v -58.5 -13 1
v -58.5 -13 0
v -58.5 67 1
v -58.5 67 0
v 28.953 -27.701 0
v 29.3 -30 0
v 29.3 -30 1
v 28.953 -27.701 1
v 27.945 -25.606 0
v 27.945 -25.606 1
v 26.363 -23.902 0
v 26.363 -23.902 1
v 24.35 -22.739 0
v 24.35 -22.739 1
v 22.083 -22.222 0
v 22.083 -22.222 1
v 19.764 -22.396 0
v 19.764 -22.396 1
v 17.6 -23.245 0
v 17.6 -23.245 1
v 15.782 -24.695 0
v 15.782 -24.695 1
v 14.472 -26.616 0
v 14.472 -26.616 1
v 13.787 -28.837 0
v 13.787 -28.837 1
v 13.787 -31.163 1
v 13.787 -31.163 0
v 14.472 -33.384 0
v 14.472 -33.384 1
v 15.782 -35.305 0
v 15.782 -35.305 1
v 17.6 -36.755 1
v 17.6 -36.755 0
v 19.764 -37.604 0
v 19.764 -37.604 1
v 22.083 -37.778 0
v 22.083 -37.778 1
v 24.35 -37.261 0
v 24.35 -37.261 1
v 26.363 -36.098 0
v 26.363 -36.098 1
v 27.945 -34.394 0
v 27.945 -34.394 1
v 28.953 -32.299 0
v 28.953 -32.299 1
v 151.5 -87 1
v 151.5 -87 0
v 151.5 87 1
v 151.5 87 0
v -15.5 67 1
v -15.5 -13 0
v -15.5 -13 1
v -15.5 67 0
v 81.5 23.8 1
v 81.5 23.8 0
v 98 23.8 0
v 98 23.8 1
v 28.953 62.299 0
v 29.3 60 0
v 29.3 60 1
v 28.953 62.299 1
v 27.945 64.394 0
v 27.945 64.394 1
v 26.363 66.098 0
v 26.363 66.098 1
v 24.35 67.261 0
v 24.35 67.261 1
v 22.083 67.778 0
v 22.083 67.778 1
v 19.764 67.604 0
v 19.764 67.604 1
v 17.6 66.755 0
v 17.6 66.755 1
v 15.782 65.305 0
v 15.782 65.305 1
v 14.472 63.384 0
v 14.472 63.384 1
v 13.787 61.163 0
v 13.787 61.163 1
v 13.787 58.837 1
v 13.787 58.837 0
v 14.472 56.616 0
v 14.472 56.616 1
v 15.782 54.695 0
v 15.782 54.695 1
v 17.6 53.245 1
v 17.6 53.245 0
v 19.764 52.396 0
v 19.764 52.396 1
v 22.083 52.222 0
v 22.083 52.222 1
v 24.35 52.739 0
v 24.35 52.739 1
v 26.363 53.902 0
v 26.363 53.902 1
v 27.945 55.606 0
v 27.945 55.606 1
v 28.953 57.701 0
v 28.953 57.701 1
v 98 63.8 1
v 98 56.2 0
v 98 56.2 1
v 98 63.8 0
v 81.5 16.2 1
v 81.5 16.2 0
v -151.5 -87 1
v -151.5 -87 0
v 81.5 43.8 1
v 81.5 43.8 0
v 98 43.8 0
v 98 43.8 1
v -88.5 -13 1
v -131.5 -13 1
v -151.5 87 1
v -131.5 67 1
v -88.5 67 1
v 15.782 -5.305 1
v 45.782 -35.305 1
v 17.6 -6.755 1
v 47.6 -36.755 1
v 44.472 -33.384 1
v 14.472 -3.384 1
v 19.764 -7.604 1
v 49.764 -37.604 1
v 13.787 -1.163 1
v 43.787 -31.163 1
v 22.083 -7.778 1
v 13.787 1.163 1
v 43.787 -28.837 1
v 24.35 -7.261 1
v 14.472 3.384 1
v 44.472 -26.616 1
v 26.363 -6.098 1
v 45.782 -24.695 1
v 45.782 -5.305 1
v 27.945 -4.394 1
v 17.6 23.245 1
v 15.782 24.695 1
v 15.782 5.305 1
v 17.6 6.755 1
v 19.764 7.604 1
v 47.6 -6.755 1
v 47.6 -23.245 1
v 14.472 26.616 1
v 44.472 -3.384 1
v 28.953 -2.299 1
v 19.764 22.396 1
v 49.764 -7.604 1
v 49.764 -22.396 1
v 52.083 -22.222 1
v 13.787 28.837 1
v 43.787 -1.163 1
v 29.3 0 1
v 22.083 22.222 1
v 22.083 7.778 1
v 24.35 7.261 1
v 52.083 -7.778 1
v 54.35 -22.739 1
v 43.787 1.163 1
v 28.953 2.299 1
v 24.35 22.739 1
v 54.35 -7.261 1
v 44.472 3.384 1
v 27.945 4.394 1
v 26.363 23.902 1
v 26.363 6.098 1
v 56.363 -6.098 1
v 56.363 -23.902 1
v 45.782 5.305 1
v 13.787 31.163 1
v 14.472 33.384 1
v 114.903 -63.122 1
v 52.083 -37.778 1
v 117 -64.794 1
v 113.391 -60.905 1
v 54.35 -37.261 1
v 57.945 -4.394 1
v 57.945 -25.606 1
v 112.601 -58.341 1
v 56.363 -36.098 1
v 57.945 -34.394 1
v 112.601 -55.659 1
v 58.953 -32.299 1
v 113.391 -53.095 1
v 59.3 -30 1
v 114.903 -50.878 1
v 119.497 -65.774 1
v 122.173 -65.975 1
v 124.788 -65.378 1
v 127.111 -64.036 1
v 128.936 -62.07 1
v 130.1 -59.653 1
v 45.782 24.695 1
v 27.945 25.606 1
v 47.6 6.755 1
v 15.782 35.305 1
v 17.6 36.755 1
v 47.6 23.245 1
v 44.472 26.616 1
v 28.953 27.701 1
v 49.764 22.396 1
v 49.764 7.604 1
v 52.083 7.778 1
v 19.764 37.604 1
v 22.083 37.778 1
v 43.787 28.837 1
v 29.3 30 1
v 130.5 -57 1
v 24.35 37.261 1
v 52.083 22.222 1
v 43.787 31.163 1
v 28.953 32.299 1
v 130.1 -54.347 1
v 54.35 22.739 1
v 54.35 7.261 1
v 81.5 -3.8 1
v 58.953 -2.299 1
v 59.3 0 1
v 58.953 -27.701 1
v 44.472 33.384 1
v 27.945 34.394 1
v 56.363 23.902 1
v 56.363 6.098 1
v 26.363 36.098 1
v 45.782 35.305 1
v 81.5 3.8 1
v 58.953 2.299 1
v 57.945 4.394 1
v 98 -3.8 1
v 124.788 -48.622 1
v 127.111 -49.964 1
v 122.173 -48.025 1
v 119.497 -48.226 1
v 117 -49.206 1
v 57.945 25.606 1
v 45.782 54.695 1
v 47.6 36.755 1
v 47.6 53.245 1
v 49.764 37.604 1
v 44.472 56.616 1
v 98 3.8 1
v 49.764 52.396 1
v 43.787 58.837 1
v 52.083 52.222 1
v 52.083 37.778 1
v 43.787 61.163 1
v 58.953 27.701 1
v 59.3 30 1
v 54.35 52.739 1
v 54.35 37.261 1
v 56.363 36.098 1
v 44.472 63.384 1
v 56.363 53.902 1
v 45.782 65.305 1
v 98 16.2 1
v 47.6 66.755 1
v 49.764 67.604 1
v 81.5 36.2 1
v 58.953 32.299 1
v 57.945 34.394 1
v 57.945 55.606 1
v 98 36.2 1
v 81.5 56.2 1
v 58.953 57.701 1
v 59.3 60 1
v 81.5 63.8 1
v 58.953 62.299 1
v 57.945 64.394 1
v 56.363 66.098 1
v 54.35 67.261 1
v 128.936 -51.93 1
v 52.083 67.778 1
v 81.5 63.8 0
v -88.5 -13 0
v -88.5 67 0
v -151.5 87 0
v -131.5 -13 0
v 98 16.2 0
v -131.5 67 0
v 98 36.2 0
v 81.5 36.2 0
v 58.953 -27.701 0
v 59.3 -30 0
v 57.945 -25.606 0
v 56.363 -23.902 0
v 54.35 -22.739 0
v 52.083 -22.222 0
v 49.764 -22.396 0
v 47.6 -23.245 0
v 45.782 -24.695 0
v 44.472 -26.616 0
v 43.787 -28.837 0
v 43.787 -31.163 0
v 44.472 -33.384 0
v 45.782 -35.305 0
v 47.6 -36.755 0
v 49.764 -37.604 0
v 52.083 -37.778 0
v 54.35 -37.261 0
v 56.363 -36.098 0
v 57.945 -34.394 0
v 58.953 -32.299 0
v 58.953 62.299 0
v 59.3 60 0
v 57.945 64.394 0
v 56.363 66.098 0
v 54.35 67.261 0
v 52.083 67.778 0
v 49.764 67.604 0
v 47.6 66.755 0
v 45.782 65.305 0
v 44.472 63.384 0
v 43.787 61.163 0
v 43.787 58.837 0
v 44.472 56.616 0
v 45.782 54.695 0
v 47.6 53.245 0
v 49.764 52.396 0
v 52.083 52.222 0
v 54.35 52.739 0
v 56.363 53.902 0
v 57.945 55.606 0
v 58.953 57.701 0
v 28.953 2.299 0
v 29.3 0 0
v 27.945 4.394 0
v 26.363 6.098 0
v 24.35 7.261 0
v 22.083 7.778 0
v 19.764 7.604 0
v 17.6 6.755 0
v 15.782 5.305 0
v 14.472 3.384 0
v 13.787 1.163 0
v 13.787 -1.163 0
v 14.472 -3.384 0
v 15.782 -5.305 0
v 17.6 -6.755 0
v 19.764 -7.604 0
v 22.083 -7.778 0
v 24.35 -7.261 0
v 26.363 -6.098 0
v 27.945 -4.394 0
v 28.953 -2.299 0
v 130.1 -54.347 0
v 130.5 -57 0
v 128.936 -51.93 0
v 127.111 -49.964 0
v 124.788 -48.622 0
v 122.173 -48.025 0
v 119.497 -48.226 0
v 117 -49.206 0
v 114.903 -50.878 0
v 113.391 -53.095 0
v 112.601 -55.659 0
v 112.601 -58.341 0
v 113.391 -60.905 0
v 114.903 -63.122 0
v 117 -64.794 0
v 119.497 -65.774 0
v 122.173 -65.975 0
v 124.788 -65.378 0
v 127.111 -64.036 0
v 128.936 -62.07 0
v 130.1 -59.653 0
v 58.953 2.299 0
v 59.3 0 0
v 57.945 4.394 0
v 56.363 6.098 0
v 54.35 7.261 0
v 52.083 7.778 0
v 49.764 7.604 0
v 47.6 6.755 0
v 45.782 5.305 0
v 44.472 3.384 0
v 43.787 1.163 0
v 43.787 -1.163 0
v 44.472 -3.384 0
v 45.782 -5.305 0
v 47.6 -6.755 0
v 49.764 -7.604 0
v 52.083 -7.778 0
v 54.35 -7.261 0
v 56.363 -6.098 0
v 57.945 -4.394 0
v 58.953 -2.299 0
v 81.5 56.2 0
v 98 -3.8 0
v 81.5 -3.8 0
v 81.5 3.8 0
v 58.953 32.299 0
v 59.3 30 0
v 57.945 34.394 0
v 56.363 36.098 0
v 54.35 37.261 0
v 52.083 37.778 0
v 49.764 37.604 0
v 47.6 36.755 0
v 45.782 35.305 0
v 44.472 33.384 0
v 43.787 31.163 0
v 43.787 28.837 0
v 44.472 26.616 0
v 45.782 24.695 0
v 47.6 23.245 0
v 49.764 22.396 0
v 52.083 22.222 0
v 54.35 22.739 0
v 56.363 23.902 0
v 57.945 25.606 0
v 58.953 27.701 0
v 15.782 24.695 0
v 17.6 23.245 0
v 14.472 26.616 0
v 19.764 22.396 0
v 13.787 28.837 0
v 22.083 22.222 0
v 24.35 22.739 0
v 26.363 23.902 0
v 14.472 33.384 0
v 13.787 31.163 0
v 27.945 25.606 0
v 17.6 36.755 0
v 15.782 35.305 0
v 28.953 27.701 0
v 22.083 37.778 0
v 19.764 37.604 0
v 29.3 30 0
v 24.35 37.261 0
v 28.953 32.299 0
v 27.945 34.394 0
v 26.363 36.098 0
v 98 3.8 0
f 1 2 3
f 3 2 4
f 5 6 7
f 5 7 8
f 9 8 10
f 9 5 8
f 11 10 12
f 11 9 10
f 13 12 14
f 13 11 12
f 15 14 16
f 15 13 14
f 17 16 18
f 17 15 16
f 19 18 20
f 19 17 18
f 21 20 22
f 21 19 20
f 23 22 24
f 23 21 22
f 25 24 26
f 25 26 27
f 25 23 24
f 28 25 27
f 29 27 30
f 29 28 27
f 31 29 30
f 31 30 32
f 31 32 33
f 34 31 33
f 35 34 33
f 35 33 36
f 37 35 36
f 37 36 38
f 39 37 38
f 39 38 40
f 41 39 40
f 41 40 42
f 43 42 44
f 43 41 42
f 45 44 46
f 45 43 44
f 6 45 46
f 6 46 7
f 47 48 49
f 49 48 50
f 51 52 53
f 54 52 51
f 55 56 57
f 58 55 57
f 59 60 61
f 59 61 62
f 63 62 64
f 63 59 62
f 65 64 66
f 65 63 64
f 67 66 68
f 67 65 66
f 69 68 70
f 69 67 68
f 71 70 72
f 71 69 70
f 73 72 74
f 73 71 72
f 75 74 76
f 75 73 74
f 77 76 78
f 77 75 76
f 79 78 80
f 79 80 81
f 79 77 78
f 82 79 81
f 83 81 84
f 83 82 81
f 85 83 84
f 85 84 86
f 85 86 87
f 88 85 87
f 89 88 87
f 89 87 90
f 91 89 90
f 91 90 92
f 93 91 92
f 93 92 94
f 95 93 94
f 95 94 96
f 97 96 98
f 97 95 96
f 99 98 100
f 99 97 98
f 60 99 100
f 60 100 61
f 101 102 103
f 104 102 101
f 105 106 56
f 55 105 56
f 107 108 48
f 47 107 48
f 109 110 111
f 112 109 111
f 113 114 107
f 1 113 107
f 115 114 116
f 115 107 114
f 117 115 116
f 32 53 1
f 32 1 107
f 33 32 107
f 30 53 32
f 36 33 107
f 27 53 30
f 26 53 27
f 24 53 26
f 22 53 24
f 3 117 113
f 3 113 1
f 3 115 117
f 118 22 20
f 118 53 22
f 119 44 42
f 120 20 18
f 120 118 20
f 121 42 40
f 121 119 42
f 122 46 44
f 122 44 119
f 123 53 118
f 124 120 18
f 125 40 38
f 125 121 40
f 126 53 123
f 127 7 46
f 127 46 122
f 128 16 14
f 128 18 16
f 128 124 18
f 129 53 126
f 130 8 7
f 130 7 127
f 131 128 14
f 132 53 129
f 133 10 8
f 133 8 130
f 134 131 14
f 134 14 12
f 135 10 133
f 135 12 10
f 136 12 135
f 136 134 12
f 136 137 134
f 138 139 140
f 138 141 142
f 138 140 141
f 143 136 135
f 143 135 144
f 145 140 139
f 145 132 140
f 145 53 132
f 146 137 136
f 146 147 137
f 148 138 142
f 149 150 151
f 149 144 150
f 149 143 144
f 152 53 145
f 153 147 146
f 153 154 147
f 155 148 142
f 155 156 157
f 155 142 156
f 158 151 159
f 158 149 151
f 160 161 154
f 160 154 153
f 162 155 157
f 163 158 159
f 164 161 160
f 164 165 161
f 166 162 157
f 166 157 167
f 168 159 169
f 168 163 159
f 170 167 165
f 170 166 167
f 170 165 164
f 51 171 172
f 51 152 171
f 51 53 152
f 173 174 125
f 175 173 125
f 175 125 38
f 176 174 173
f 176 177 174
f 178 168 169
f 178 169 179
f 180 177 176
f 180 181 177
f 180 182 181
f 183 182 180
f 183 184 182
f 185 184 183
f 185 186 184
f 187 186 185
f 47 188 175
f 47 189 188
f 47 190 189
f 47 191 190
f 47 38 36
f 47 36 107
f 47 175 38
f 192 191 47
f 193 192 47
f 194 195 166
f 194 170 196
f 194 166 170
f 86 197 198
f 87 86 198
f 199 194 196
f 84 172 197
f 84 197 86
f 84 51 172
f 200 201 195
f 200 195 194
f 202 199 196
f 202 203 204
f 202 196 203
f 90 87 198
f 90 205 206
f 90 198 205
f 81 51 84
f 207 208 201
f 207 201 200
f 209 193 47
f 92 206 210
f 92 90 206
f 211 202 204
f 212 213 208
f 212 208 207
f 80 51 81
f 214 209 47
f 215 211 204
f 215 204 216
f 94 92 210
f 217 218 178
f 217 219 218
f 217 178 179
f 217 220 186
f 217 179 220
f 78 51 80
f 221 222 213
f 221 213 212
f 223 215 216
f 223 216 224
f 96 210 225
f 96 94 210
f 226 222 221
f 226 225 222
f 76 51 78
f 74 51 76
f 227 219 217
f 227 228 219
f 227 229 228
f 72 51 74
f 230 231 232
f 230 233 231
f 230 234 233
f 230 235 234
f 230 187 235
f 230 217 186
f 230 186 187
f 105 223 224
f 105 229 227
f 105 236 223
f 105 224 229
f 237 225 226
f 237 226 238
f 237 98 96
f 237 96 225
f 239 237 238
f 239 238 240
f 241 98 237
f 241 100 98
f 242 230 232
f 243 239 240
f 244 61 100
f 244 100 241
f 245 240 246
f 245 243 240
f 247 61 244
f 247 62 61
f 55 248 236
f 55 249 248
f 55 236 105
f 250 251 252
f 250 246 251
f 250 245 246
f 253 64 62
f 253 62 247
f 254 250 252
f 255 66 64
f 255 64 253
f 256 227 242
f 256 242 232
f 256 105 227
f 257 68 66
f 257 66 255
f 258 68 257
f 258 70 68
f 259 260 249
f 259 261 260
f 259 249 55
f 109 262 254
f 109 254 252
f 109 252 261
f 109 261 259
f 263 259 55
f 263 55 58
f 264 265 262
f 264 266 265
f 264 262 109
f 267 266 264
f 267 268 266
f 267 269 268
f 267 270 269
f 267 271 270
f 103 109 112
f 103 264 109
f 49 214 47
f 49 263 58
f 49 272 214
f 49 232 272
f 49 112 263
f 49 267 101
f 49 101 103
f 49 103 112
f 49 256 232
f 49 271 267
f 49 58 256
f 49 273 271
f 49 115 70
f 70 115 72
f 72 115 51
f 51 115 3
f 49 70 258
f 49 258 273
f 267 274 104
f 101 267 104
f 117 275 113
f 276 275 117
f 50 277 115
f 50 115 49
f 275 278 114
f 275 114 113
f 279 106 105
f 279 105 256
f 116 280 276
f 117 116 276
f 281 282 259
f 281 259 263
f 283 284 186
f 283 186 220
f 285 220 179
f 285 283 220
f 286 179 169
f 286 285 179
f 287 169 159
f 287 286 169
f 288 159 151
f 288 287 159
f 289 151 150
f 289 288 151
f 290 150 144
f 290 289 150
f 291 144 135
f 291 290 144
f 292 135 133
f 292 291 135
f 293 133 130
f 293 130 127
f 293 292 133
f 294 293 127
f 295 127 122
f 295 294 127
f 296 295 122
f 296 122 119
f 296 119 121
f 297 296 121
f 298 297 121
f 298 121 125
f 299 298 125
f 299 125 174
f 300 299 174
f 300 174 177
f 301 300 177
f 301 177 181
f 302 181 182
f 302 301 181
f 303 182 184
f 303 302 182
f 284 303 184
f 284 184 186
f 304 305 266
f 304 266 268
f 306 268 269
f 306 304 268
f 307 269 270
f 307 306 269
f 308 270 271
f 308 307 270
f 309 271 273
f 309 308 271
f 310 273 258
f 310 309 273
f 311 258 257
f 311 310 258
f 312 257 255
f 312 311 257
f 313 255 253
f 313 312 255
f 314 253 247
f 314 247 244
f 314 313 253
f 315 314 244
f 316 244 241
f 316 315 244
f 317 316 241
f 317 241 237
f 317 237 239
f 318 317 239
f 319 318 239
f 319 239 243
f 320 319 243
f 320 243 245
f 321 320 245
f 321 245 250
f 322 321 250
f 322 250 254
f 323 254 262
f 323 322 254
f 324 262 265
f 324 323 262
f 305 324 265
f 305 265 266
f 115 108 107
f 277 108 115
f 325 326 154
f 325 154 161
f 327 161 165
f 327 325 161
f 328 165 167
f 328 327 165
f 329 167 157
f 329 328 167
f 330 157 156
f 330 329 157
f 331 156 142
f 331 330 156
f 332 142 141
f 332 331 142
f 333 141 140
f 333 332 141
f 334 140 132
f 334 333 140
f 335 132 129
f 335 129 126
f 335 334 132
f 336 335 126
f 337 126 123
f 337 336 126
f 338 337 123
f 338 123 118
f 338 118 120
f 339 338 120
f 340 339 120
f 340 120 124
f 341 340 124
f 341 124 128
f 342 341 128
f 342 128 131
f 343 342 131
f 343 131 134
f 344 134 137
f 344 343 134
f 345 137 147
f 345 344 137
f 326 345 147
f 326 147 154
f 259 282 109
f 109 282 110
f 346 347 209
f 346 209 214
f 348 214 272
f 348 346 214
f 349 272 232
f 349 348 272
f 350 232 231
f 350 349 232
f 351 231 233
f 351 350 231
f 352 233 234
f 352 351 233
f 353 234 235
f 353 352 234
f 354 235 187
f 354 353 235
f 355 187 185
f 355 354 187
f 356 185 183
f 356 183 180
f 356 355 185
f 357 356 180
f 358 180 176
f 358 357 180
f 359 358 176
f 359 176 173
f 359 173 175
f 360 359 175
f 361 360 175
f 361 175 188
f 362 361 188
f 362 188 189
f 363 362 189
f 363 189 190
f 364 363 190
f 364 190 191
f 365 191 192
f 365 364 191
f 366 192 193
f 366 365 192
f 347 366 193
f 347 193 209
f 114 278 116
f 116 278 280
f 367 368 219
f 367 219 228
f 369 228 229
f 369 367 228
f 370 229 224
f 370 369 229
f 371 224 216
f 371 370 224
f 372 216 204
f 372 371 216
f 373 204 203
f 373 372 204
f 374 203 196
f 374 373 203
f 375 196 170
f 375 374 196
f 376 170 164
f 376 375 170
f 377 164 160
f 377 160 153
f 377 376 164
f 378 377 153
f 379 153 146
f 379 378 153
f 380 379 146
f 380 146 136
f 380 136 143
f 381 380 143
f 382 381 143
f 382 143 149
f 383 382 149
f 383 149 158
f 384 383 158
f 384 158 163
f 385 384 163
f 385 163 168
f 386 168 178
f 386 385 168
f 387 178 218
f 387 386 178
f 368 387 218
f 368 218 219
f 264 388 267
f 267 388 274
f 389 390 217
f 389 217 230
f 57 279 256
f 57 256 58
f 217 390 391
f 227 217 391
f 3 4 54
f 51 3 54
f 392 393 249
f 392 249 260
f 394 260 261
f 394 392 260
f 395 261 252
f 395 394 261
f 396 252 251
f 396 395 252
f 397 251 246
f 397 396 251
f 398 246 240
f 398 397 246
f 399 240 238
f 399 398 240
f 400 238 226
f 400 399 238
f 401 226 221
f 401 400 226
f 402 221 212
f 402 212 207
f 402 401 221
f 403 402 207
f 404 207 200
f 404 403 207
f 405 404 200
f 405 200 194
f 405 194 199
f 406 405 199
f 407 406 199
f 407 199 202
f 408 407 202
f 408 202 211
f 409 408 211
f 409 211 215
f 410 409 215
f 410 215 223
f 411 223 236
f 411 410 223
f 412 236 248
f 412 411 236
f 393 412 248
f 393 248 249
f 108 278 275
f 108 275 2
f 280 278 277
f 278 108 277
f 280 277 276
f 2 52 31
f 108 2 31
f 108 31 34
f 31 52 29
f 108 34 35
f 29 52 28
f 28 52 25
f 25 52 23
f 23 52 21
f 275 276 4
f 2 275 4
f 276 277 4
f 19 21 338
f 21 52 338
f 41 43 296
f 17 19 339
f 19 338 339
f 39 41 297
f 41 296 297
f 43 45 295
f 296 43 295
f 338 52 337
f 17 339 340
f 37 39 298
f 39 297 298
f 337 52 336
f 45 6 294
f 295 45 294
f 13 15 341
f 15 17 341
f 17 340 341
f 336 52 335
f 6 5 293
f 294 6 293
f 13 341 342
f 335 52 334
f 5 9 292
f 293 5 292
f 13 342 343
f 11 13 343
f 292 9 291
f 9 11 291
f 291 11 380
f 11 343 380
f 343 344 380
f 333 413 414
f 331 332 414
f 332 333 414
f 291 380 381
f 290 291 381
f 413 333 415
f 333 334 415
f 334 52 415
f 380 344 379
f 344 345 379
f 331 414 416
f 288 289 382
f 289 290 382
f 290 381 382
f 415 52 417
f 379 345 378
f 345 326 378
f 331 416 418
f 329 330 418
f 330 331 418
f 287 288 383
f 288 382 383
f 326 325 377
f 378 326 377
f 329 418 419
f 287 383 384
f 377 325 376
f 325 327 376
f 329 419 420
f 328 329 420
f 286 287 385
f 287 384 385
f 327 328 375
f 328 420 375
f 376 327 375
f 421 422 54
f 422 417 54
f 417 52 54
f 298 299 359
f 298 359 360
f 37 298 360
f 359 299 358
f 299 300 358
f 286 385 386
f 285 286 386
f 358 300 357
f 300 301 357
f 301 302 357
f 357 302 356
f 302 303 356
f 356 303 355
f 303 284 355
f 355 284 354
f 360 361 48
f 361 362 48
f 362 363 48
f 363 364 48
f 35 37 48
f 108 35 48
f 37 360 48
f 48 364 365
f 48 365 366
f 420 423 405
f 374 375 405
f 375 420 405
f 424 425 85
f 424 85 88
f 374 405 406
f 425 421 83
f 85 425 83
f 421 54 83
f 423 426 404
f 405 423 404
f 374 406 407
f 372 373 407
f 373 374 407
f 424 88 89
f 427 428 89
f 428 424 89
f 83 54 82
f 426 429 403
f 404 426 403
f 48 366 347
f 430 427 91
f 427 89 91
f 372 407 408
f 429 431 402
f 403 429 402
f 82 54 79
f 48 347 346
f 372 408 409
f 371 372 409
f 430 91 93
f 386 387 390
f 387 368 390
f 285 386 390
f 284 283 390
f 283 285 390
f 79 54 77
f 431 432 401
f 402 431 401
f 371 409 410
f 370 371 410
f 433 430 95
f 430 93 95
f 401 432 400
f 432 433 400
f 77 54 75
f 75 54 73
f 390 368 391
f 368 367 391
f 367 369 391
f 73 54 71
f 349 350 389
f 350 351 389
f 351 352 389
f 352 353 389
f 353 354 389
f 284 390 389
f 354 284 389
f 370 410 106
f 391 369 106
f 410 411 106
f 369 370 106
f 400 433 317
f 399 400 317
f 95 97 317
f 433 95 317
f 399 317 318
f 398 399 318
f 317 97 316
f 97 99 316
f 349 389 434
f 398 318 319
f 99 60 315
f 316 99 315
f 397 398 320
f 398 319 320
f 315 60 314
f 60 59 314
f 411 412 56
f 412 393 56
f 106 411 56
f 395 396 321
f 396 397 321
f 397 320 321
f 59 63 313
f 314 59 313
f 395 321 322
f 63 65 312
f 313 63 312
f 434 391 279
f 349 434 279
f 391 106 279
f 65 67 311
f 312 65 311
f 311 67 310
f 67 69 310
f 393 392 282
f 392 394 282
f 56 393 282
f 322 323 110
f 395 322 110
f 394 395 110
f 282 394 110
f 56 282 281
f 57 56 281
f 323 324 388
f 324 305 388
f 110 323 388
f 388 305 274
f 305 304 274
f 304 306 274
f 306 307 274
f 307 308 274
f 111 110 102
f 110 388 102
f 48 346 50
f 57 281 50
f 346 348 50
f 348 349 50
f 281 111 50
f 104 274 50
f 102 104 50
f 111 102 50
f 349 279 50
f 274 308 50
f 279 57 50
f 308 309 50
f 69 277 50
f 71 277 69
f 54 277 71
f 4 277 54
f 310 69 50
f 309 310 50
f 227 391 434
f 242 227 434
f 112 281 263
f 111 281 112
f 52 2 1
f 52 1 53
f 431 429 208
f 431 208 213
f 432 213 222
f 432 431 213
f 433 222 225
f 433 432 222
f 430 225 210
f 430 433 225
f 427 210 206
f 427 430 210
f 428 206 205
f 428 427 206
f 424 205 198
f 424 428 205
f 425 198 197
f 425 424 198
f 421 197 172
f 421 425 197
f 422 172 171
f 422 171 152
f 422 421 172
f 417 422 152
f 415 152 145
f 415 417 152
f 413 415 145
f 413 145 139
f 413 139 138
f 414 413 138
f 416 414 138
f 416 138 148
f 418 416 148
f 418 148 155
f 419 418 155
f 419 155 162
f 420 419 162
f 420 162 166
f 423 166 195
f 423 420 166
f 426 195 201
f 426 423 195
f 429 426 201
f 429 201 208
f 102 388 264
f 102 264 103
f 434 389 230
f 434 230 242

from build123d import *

# Parameters (mm, degrees)
F0_W     = 303
F0_H     = 174
F0_R     = 9
F0_R_2   = 7.8
F0_W_2   = 43
F0_H_2   = 80
F0_W_3   = 16.5
F0_H_3   = 7.6
F1_DEPTH = 1


with BuildPart() as f1:
    # F0 (on Top) → F1 (new body)
    with BuildSketch(Plane.XY):
        Rectangle(F0_W, F0_H)
        with Locations((121.5, -57)):
            Circle(F0_R, mode=Mode.SUBTRACT)
        with Locations((21.5, -30)):
            Circle(F0_R_2, mode=Mode.SUBTRACT)
        with Locations((51.5, -30)):
            Circle(F0_R_2, mode=Mode.SUBTRACT)
        with Locations((-110, 27)):
            Rectangle(F0_W_2, F0_H_2, mode=Mode.SUBTRACT)
        with Locations((-37, 27)):
            Rectangle(F0_W_2, F0_H_2, mode=Mode.SUBTRACT)
        with Locations((21.5, 0)):
            Circle(F0_R_2, mode=Mode.SUBTRACT)
        with Locations((51.5, 0)):
            Circle(F0_R_2, mode=Mode.SUBTRACT)
        with Locations((21.5, 30)):
            Circle(F0_R_2, mode=Mode.SUBTRACT)
        with Locations((51.5, 30)):
            Circle(F0_R_2, mode=Mode.SUBTRACT)
        with Locations((89.75, 0)):
            Rectangle(F0_W_3, F0_H_3, mode=Mode.SUBTRACT)
        with Locations((89.75, 20)):
            Rectangle(F0_W_3, F0_H_3, mode=Mode.SUBTRACT)
        with Locations((89.75, 40)):
            Rectangle(F0_W_3, F0_H_3, mode=Mode.SUBTRACT)
        with Locations((21.5, 60)):
            Circle(F0_R_2, mode=Mode.SUBTRACT)
        with Locations((51.5, 60)):
            Circle(F0_R_2, mode=Mode.SUBTRACT)
        with Locations((89.75, 60)):
            Rectangle(F0_W_3, F0_H_3, mode=Mode.SUBTRACT)
    extrude(amount=F1_DEPTH)


solid = f1.part
